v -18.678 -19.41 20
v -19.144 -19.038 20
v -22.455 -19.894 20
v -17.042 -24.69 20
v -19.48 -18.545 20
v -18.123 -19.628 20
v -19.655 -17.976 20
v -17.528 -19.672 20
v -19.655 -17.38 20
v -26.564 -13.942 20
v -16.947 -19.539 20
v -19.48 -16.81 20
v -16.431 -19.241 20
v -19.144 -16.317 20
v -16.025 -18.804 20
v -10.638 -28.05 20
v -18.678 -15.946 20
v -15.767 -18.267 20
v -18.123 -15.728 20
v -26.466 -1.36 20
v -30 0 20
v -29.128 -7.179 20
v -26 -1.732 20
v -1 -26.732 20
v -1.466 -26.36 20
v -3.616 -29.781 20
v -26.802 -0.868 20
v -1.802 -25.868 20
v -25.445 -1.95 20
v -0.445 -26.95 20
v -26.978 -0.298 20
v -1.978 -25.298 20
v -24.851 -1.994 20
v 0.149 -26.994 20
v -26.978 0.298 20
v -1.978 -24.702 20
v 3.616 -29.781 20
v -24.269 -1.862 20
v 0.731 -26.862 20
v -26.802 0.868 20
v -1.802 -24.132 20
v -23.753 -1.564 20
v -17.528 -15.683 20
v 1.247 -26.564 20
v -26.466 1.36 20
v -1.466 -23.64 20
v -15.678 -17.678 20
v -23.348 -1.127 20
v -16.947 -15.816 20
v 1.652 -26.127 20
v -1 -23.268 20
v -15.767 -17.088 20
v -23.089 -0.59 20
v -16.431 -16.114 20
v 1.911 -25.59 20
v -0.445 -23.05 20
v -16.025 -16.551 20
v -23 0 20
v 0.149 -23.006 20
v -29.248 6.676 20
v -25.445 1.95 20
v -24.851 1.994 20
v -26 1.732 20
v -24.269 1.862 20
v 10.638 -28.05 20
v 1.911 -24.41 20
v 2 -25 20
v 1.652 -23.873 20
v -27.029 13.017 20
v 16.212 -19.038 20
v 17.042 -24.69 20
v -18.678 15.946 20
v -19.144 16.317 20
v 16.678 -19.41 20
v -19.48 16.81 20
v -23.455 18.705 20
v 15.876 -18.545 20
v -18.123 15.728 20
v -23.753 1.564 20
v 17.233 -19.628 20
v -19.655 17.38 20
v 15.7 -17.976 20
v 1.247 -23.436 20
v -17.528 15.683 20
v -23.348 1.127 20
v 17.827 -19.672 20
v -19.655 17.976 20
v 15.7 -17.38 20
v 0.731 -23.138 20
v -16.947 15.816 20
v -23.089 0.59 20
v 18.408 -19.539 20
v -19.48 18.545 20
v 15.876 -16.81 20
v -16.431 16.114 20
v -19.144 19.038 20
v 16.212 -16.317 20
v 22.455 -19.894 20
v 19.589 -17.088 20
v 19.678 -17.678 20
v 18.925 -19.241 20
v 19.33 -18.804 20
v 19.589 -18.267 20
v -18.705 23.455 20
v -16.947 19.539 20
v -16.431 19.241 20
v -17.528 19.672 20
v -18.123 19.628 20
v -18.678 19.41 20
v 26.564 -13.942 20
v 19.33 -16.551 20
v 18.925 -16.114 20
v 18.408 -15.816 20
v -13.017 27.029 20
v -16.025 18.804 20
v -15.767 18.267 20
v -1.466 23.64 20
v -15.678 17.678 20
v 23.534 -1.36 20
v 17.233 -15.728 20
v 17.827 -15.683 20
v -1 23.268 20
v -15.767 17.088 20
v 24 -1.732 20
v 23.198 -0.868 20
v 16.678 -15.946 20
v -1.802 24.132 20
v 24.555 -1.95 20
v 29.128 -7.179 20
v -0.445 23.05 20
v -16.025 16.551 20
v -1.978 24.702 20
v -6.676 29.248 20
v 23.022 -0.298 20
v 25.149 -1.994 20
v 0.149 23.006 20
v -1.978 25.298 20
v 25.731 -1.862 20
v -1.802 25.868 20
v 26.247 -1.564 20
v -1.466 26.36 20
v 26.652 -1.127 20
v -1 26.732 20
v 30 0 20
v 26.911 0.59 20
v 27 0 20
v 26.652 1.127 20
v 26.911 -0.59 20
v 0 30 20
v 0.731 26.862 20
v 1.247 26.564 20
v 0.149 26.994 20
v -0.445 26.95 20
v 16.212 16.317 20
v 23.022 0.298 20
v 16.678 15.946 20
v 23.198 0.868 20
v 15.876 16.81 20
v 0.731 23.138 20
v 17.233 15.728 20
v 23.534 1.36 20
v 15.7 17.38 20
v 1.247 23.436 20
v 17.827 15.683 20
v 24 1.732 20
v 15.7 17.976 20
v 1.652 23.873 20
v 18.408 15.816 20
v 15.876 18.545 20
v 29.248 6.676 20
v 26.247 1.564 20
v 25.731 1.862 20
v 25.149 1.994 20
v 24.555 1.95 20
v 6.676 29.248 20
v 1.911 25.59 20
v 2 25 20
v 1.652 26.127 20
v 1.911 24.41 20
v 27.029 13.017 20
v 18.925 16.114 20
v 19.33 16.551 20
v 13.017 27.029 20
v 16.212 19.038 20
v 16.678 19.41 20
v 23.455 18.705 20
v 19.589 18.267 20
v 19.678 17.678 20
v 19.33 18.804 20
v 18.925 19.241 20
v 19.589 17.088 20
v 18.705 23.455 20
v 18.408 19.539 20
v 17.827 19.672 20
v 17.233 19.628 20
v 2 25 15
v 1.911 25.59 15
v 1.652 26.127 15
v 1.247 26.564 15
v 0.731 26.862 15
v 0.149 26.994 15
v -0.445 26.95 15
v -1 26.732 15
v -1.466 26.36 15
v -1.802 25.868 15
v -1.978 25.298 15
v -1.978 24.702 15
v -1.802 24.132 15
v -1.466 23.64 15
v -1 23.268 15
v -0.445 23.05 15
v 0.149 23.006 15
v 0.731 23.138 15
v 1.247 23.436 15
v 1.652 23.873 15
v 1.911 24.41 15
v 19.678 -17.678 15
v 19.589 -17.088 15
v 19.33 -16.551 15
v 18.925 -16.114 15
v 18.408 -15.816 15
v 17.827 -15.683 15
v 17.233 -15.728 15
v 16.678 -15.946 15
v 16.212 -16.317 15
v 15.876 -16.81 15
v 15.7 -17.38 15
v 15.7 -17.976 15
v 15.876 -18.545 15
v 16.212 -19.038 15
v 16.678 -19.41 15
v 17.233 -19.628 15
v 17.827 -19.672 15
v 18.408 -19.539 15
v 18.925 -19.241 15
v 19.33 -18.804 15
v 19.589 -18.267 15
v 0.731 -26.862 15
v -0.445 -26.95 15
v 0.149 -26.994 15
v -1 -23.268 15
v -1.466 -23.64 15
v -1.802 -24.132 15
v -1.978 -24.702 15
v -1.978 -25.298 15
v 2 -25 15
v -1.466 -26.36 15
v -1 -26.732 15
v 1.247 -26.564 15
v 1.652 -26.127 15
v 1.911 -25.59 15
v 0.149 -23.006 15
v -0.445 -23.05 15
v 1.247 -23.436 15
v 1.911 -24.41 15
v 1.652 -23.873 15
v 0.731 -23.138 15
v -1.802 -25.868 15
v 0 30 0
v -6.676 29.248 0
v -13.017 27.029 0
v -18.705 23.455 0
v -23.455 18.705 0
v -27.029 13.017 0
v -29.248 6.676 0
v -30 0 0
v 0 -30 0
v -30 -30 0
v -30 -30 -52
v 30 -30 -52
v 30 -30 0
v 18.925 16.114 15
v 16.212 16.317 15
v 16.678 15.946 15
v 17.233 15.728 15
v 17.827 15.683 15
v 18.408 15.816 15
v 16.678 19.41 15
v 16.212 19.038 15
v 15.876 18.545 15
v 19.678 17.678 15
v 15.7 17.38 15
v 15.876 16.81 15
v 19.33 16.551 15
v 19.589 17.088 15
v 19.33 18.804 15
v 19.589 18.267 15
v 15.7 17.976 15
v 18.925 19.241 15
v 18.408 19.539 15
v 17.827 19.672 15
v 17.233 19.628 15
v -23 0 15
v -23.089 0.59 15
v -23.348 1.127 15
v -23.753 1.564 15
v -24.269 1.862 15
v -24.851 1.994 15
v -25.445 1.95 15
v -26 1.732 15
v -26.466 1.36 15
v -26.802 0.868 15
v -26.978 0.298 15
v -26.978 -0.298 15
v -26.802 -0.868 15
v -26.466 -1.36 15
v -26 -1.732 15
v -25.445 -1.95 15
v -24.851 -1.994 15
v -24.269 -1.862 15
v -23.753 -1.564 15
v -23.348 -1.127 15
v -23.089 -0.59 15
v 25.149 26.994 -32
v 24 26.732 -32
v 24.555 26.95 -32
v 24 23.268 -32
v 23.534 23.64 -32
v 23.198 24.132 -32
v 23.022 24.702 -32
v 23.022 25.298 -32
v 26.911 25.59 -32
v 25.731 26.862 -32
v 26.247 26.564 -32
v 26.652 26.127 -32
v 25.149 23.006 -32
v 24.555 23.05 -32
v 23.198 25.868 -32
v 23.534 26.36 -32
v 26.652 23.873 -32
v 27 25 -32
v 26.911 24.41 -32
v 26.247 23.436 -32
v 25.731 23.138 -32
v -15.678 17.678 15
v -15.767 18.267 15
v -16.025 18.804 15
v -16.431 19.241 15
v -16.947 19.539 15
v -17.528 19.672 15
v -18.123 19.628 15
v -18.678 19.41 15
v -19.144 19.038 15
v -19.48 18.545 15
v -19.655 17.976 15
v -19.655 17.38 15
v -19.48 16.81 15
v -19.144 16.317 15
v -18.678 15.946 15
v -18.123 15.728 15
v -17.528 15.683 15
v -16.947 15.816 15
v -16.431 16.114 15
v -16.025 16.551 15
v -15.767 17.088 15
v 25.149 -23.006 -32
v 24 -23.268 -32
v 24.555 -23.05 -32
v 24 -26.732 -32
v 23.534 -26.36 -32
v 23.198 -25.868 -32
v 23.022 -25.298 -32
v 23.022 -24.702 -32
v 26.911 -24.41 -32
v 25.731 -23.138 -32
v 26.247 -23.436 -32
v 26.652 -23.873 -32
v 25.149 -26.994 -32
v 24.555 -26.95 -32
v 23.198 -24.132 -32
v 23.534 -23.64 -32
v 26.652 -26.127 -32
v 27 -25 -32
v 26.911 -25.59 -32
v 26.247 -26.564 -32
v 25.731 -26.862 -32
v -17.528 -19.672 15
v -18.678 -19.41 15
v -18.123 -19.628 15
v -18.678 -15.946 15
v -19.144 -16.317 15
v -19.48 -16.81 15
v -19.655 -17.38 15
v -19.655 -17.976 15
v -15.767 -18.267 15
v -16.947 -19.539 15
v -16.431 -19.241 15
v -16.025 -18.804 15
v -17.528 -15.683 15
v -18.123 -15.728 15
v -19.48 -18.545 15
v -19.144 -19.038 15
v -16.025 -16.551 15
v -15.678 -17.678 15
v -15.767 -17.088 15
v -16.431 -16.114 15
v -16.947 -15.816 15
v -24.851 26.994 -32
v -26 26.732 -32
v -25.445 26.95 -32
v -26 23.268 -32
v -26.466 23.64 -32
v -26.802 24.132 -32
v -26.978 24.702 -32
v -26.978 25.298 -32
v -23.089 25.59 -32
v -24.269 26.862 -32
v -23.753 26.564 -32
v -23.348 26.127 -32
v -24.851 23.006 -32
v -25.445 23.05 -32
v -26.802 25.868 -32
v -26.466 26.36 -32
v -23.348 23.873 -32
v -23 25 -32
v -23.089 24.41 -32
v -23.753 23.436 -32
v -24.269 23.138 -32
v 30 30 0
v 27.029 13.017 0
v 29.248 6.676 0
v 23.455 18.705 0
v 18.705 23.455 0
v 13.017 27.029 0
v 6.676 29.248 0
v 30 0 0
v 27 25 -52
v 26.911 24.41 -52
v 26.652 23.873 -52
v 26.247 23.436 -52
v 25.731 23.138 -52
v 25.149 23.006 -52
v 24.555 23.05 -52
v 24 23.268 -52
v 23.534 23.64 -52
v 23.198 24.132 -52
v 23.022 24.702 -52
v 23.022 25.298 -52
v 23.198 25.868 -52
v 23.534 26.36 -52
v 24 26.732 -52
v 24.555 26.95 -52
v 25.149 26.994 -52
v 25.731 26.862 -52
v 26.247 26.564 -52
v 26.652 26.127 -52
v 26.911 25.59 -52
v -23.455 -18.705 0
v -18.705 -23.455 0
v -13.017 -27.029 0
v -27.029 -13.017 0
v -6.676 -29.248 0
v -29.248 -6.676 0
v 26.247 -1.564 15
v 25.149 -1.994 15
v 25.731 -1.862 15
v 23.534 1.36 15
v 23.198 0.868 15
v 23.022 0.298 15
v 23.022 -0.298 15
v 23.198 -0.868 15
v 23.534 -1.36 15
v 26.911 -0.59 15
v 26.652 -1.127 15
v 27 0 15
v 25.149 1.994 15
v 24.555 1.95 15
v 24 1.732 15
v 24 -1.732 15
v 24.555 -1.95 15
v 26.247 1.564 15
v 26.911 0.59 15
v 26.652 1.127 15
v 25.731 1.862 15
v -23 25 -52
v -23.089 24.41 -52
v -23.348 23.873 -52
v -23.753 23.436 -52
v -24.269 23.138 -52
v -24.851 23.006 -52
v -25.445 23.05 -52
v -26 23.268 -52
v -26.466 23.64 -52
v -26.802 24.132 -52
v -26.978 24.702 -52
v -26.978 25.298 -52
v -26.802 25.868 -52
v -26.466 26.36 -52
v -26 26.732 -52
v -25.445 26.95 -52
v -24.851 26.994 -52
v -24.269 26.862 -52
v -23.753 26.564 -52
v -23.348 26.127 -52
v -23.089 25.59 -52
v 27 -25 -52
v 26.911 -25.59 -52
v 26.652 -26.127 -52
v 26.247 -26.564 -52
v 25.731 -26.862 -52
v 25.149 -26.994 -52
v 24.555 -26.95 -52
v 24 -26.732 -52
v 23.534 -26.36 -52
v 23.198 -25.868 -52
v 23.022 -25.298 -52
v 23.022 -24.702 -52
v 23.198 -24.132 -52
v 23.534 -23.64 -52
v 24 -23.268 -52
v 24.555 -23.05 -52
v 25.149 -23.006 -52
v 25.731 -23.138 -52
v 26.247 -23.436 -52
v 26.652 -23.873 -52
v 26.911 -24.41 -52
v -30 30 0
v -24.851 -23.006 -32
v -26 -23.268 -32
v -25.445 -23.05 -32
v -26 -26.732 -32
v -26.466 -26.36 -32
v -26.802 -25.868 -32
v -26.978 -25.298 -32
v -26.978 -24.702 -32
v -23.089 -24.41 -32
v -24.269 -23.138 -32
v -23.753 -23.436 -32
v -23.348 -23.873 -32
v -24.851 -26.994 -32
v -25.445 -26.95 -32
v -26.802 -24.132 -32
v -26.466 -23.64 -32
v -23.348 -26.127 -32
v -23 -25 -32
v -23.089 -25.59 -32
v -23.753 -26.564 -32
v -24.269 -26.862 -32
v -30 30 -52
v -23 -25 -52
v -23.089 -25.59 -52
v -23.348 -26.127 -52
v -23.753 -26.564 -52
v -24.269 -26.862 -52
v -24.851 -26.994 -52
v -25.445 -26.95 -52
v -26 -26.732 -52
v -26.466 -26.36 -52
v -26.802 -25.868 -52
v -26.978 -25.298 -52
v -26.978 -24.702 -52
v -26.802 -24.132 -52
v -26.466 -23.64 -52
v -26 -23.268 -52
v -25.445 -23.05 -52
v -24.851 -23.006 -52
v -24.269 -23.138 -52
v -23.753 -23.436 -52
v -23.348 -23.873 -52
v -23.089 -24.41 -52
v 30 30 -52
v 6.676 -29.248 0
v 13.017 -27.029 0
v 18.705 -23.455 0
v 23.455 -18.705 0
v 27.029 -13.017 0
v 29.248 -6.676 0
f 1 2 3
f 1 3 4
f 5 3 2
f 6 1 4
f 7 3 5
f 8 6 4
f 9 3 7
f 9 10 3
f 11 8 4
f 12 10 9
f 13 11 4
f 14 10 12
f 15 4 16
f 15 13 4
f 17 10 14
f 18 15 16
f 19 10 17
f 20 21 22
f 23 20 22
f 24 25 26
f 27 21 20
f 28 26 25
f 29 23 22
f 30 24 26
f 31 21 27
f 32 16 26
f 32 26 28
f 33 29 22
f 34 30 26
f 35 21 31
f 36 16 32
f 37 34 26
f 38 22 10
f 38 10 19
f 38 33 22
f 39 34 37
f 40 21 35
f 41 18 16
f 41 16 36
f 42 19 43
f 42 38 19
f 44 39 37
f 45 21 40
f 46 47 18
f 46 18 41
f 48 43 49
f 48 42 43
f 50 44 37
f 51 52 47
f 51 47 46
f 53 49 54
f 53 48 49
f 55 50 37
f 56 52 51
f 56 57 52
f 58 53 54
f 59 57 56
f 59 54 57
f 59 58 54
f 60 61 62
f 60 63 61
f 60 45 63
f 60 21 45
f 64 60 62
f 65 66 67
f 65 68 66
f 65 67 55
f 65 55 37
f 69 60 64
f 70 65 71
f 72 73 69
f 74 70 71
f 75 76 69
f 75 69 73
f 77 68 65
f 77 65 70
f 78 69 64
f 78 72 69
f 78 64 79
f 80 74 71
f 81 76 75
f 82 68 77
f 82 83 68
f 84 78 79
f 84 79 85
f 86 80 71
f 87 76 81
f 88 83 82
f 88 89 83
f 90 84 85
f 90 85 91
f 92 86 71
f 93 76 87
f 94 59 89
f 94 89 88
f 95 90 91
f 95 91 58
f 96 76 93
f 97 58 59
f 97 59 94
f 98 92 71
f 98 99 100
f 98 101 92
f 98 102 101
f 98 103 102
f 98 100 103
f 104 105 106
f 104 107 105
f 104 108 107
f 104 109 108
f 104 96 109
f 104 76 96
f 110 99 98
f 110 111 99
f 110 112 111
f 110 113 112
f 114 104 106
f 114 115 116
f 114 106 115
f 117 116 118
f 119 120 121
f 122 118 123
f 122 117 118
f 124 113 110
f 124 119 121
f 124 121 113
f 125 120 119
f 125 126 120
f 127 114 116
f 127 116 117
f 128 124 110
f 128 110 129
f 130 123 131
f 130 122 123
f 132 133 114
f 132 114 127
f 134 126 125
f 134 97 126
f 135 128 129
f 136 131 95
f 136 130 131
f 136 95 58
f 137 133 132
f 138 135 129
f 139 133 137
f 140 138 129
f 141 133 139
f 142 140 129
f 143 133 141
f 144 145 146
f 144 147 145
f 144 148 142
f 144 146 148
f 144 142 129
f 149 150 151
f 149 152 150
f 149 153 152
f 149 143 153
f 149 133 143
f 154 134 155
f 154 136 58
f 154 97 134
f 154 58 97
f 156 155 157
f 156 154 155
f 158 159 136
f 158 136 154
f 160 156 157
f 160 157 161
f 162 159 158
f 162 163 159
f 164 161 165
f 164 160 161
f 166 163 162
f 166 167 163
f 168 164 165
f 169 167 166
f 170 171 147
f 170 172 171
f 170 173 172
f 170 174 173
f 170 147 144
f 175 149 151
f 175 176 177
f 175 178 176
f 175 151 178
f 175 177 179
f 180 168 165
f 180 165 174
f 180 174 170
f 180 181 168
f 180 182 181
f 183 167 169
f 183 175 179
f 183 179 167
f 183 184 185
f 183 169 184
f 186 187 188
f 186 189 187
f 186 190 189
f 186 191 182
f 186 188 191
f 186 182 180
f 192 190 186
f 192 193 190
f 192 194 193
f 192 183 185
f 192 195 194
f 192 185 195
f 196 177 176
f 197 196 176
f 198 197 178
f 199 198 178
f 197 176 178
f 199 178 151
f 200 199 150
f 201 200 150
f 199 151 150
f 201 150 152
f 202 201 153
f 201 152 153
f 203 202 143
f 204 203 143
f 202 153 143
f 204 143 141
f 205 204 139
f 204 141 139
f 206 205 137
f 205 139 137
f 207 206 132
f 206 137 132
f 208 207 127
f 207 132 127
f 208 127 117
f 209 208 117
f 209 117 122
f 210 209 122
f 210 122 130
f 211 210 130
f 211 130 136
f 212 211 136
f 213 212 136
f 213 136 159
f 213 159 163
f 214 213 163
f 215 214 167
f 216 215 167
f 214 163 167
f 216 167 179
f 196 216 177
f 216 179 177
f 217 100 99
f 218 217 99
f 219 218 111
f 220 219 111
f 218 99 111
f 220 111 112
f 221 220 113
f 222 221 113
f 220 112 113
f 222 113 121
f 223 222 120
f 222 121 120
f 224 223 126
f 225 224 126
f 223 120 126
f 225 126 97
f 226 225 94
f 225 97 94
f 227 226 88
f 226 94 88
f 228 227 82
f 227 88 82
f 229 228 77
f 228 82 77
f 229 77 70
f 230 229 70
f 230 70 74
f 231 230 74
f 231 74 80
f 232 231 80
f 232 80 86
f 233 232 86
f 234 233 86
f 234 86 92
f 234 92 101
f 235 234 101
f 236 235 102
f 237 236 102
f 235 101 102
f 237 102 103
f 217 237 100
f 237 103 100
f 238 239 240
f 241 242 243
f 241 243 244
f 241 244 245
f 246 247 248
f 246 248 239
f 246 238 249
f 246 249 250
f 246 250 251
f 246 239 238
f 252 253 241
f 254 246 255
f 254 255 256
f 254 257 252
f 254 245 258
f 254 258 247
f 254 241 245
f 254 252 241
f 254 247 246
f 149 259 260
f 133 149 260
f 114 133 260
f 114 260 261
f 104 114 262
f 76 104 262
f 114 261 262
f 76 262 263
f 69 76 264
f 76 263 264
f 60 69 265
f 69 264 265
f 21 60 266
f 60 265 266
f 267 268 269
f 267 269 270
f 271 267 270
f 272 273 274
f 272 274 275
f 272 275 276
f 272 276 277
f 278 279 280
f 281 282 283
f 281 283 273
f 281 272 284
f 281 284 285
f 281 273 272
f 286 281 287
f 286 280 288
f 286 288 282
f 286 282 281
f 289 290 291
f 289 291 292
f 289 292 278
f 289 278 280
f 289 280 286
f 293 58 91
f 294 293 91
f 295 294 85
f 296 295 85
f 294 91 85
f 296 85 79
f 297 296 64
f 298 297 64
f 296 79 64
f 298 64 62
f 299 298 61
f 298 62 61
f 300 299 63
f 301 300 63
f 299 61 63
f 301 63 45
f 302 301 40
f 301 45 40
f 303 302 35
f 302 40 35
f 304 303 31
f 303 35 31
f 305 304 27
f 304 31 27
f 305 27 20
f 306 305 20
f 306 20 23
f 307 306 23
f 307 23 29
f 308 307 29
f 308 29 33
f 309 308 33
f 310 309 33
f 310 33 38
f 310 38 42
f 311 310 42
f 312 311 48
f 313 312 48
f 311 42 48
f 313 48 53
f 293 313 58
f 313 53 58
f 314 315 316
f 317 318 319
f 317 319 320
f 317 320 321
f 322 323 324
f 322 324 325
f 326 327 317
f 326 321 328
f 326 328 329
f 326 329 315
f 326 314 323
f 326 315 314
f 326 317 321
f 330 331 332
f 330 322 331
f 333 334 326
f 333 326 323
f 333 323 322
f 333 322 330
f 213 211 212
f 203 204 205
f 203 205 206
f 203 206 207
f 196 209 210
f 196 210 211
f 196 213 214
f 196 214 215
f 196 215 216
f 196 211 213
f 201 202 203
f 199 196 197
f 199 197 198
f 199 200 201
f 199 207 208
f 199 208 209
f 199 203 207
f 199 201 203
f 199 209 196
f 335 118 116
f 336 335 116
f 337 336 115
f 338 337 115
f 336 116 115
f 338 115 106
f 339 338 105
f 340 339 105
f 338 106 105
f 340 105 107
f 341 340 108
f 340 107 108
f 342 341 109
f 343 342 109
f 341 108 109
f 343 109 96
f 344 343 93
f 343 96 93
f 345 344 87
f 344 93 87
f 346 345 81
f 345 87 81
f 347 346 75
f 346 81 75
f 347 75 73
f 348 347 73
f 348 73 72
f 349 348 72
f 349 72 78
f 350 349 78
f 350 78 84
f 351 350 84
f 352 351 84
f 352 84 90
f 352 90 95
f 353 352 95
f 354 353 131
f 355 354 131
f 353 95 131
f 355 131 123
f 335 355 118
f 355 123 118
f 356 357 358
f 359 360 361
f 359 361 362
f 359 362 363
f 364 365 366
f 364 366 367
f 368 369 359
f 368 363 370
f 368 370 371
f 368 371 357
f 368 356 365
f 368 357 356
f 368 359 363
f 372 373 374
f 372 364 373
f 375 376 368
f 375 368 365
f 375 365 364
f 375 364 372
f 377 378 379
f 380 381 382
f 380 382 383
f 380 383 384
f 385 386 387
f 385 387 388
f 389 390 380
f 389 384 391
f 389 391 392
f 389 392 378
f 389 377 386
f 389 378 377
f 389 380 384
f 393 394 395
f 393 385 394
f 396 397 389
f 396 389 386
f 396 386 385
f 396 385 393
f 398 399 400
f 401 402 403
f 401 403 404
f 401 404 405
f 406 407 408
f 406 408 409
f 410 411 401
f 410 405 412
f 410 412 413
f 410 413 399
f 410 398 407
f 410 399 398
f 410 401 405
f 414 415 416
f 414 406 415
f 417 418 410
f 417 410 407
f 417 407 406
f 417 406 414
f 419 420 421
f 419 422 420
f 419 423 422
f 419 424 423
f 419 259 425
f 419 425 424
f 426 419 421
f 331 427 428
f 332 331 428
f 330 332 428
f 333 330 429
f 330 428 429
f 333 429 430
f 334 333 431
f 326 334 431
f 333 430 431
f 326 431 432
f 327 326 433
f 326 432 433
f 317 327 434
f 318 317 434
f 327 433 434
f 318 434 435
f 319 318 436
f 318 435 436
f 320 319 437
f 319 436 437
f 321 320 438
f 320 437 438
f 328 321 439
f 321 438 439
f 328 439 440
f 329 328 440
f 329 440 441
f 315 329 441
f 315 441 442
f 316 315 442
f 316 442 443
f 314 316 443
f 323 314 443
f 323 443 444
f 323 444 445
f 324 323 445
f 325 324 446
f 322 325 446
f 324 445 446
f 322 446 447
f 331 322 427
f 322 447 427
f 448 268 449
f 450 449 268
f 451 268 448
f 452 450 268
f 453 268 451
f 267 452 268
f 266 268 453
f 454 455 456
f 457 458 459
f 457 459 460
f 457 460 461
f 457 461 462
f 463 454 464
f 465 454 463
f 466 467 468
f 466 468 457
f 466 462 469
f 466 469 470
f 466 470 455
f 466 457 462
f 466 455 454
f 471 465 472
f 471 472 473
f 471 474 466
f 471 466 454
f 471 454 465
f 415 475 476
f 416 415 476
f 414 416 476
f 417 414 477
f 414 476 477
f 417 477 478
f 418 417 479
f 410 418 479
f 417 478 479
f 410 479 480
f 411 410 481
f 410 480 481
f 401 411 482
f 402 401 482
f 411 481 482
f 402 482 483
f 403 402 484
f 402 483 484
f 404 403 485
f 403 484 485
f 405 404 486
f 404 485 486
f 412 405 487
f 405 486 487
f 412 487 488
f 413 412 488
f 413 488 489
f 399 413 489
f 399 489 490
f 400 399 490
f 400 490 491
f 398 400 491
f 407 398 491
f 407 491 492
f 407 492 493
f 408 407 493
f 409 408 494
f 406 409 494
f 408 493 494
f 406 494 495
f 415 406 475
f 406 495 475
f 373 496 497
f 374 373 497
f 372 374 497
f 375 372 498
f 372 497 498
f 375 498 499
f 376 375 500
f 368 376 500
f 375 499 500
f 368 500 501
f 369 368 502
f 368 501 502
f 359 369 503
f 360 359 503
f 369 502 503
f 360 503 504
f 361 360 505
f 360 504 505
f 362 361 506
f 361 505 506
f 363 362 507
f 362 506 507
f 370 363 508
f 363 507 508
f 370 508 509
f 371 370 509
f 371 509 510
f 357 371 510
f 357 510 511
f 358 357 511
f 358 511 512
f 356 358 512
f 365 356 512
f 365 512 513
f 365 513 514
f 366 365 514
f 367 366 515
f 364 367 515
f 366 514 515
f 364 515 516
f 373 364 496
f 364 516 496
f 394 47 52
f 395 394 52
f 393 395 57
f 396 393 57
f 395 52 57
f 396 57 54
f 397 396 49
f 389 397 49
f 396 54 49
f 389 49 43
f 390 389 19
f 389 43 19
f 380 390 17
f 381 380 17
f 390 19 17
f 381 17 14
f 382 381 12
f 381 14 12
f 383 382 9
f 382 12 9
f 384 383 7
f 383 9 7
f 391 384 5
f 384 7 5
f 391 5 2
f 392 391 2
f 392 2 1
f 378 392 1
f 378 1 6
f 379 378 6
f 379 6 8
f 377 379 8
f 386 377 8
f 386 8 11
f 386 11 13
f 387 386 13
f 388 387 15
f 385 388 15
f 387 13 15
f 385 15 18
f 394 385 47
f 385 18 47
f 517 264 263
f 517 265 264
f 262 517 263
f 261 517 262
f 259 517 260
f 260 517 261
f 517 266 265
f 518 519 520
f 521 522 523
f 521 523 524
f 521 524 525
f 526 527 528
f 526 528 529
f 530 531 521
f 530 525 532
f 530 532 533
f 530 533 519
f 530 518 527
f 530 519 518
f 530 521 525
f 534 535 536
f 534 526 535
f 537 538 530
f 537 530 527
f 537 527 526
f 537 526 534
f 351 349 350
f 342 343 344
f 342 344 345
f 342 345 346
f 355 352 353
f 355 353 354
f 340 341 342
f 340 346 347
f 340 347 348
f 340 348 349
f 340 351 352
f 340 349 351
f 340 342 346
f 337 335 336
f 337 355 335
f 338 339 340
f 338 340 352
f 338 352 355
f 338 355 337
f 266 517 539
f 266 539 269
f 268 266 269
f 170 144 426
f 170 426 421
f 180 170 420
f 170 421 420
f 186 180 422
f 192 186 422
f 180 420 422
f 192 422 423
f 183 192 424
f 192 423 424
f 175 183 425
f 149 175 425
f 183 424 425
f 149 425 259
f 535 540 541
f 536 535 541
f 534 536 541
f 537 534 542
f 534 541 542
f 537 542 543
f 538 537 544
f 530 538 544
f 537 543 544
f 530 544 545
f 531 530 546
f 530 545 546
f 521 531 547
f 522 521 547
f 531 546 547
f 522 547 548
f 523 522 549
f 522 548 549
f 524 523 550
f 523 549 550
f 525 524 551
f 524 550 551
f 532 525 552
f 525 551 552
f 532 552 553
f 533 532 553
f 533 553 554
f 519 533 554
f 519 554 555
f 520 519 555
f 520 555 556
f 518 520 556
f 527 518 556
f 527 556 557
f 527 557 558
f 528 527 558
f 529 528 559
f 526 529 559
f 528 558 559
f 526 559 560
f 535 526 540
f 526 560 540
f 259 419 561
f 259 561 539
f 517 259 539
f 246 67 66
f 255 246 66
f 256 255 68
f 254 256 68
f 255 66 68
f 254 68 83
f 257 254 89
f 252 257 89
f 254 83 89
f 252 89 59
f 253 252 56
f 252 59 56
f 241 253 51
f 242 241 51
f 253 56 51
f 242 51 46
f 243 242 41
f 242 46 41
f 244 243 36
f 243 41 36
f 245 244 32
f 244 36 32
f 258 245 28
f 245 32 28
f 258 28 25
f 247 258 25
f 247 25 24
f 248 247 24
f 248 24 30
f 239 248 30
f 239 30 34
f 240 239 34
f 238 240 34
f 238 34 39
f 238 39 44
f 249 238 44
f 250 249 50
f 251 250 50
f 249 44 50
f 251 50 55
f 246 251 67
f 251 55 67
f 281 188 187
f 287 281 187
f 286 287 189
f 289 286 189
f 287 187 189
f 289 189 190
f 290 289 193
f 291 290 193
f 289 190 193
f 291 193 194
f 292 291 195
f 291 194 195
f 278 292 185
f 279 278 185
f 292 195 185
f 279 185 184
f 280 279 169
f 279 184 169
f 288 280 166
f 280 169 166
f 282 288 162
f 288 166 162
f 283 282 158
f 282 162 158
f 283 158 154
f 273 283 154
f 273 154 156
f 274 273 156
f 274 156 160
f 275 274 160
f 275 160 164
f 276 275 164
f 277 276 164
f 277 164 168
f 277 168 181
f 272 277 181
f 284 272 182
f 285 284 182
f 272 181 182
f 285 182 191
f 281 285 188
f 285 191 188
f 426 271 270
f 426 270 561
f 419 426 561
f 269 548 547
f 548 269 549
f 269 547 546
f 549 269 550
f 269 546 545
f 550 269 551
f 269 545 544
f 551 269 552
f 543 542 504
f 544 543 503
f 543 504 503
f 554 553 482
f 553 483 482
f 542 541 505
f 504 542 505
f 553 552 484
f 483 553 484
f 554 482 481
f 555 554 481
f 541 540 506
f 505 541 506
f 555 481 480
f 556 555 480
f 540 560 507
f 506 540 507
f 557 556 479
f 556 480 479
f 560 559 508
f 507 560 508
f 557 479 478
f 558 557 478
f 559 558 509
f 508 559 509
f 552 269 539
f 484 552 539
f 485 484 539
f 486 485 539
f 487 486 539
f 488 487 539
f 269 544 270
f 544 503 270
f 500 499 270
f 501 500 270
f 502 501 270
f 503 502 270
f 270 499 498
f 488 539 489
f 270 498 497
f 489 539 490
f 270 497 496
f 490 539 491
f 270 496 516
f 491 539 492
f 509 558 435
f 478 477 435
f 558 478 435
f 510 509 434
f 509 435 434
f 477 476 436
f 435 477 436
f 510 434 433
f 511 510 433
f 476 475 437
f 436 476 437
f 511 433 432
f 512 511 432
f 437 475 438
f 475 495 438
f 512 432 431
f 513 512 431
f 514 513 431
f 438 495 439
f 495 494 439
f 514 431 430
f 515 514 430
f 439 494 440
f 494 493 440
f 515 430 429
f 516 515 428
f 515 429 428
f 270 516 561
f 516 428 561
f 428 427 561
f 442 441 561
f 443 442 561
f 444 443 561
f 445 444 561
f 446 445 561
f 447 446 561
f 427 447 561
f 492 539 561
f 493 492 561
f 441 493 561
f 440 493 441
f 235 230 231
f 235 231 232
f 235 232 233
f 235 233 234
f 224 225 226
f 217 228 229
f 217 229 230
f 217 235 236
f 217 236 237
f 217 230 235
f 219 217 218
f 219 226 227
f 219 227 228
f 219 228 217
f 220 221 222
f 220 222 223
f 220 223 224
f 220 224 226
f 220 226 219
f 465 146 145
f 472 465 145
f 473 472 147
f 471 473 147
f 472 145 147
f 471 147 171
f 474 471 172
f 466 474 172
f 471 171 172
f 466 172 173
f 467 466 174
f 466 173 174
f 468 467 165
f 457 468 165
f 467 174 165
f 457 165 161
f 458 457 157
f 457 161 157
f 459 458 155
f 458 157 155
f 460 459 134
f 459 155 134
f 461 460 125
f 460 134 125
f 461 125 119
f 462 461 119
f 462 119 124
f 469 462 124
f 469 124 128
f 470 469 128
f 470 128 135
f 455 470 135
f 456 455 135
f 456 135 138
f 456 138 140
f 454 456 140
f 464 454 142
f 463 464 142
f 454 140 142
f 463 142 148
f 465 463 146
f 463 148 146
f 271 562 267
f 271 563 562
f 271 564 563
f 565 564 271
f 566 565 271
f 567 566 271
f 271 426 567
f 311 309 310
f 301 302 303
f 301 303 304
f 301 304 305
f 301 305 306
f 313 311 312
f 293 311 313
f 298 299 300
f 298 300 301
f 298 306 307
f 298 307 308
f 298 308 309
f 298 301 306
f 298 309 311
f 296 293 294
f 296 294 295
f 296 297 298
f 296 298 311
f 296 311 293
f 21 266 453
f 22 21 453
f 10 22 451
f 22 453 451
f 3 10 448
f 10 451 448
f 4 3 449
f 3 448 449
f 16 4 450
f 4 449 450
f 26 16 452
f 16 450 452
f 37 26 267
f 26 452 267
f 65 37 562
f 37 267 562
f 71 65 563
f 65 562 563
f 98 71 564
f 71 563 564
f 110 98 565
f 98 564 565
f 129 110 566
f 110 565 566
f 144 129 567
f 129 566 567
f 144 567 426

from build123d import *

# Parameters (mm, degrees)
F1_DEPTH = 52
F2_DEPTH = 20
F3_R     = 2
F4_DEPTH = 5
F5_R     = 2
F6_DEPTH = 20


with BuildPart() as f1:
    # F0 (on Top) → F1 (new body)
    with BuildSketch(Plane.XY):
        with BuildLine():
            Line((4.28e-08, 30), (-30, 30))
            Line((-30, 30), (-30, 0))
            ThreePointArc((-30, 0), (-21.2132034204, 21.2132034507), (4.28e-08, 30))
        make_face()
        with BuildLine():
            Line((30, 30), (4.28e-08, 30))
            ThreePointArc((4.28e-08, 30), (21.2132034507, 21.2132034204), (30, 0))
            Line((30, 0), (30, 30))
        make_face()
        with BuildLine():
            ThreePointArc((30, 0), (21.2132034507, 21.2132034204), (4.28e-08, 30))
            ThreePointArc((4.28e-08, 30), (-21.2132034204, 21.2132034507), (-30, 0))
            ThreePointArc((-30, 0), (-21.2132034356, -21.2132034356), (0, -30))
            ThreePointArc((0, -30), (21.2132034356, -21.2132034356), (30, 0))
        make_face()
        with BuildLine():
            ThreePointArc((0, -30), (-21.2132034356, -21.2132034356), (-30, 0))
            Line((-30, 0), (-30, -30))
            Line((-30, -30), (0, -30))
        make_face()
        with BuildLine():
            Line((30, -30), (30, 0))
            ThreePointArc((30, 0), (21.2132034356, -21.2132034356), (0, -30))
            Line((0, -30), (30, -30))
        make_face()
    extrude(amount=-F1_DEPTH)

    # F0 (on Top) → F2 (join)
    with BuildSketch(Plane.XY):
        with BuildLine():
            ThreePointArc((30, 0), (21.2132034507, 21.2132034204), (4.28e-08, 30))
            ThreePointArc((4.28e-08, 30), (-21.2132034204, 21.2132034507), (-30, 0))
            ThreePointArc((-30, 0), (-21.2132034356, -21.2132034356), (0, -30))
            ThreePointArc((0, -30), (21.2132034356, -21.2132034356), (30, 0))
        make_face()
    extrude(amount=F2_DEPTH)

    # F3 (on face) → F4 (cut)
    with BuildSketch(Plane.XY.offset(20)):
        with Locations((0, 25)):
            Circle(F3_R)
        with Locations((-17.6776695297, 17.6776695297)):
            Circle(F3_R)
        with Locations((-25, 0)):
            Circle(F3_R)
        with Locations((-17.6776695297, -17.6776695297)):
            Circle(F3_R)
        with Locations((0, -25)):
            Circle(F3_R)
        with Locations((17.6776695297, -17.6776695297)):
            Circle(F3_R)
        with Locations((25, 0)):
            Circle(F3_R)
        with Locations((17.6776695297, 17.6776695297)):
            Circle(F3_R)
    extrude(amount=-F4_DEPTH, mode=Mode.SUBTRACT)

    # F5 (on face) → F6 (cut)
    with BuildSketch(Plane(origin=(0, 0, -52), x_dir=(1, 0, 0), z_dir=(0, 0, -1))):
        with Locations((-25, 25)):
            Circle(F5_R)
        with Locations((25, -25)):
            Circle(F5_R)
        with Locations((25, 25)):
            Circle(F5_R)
        with Locations((-25, -25)):
            Circle(F5_R)
    extrude(amount=-F6_DEPTH, mode=Mode.SUBTRACT)


solid = f1.part
